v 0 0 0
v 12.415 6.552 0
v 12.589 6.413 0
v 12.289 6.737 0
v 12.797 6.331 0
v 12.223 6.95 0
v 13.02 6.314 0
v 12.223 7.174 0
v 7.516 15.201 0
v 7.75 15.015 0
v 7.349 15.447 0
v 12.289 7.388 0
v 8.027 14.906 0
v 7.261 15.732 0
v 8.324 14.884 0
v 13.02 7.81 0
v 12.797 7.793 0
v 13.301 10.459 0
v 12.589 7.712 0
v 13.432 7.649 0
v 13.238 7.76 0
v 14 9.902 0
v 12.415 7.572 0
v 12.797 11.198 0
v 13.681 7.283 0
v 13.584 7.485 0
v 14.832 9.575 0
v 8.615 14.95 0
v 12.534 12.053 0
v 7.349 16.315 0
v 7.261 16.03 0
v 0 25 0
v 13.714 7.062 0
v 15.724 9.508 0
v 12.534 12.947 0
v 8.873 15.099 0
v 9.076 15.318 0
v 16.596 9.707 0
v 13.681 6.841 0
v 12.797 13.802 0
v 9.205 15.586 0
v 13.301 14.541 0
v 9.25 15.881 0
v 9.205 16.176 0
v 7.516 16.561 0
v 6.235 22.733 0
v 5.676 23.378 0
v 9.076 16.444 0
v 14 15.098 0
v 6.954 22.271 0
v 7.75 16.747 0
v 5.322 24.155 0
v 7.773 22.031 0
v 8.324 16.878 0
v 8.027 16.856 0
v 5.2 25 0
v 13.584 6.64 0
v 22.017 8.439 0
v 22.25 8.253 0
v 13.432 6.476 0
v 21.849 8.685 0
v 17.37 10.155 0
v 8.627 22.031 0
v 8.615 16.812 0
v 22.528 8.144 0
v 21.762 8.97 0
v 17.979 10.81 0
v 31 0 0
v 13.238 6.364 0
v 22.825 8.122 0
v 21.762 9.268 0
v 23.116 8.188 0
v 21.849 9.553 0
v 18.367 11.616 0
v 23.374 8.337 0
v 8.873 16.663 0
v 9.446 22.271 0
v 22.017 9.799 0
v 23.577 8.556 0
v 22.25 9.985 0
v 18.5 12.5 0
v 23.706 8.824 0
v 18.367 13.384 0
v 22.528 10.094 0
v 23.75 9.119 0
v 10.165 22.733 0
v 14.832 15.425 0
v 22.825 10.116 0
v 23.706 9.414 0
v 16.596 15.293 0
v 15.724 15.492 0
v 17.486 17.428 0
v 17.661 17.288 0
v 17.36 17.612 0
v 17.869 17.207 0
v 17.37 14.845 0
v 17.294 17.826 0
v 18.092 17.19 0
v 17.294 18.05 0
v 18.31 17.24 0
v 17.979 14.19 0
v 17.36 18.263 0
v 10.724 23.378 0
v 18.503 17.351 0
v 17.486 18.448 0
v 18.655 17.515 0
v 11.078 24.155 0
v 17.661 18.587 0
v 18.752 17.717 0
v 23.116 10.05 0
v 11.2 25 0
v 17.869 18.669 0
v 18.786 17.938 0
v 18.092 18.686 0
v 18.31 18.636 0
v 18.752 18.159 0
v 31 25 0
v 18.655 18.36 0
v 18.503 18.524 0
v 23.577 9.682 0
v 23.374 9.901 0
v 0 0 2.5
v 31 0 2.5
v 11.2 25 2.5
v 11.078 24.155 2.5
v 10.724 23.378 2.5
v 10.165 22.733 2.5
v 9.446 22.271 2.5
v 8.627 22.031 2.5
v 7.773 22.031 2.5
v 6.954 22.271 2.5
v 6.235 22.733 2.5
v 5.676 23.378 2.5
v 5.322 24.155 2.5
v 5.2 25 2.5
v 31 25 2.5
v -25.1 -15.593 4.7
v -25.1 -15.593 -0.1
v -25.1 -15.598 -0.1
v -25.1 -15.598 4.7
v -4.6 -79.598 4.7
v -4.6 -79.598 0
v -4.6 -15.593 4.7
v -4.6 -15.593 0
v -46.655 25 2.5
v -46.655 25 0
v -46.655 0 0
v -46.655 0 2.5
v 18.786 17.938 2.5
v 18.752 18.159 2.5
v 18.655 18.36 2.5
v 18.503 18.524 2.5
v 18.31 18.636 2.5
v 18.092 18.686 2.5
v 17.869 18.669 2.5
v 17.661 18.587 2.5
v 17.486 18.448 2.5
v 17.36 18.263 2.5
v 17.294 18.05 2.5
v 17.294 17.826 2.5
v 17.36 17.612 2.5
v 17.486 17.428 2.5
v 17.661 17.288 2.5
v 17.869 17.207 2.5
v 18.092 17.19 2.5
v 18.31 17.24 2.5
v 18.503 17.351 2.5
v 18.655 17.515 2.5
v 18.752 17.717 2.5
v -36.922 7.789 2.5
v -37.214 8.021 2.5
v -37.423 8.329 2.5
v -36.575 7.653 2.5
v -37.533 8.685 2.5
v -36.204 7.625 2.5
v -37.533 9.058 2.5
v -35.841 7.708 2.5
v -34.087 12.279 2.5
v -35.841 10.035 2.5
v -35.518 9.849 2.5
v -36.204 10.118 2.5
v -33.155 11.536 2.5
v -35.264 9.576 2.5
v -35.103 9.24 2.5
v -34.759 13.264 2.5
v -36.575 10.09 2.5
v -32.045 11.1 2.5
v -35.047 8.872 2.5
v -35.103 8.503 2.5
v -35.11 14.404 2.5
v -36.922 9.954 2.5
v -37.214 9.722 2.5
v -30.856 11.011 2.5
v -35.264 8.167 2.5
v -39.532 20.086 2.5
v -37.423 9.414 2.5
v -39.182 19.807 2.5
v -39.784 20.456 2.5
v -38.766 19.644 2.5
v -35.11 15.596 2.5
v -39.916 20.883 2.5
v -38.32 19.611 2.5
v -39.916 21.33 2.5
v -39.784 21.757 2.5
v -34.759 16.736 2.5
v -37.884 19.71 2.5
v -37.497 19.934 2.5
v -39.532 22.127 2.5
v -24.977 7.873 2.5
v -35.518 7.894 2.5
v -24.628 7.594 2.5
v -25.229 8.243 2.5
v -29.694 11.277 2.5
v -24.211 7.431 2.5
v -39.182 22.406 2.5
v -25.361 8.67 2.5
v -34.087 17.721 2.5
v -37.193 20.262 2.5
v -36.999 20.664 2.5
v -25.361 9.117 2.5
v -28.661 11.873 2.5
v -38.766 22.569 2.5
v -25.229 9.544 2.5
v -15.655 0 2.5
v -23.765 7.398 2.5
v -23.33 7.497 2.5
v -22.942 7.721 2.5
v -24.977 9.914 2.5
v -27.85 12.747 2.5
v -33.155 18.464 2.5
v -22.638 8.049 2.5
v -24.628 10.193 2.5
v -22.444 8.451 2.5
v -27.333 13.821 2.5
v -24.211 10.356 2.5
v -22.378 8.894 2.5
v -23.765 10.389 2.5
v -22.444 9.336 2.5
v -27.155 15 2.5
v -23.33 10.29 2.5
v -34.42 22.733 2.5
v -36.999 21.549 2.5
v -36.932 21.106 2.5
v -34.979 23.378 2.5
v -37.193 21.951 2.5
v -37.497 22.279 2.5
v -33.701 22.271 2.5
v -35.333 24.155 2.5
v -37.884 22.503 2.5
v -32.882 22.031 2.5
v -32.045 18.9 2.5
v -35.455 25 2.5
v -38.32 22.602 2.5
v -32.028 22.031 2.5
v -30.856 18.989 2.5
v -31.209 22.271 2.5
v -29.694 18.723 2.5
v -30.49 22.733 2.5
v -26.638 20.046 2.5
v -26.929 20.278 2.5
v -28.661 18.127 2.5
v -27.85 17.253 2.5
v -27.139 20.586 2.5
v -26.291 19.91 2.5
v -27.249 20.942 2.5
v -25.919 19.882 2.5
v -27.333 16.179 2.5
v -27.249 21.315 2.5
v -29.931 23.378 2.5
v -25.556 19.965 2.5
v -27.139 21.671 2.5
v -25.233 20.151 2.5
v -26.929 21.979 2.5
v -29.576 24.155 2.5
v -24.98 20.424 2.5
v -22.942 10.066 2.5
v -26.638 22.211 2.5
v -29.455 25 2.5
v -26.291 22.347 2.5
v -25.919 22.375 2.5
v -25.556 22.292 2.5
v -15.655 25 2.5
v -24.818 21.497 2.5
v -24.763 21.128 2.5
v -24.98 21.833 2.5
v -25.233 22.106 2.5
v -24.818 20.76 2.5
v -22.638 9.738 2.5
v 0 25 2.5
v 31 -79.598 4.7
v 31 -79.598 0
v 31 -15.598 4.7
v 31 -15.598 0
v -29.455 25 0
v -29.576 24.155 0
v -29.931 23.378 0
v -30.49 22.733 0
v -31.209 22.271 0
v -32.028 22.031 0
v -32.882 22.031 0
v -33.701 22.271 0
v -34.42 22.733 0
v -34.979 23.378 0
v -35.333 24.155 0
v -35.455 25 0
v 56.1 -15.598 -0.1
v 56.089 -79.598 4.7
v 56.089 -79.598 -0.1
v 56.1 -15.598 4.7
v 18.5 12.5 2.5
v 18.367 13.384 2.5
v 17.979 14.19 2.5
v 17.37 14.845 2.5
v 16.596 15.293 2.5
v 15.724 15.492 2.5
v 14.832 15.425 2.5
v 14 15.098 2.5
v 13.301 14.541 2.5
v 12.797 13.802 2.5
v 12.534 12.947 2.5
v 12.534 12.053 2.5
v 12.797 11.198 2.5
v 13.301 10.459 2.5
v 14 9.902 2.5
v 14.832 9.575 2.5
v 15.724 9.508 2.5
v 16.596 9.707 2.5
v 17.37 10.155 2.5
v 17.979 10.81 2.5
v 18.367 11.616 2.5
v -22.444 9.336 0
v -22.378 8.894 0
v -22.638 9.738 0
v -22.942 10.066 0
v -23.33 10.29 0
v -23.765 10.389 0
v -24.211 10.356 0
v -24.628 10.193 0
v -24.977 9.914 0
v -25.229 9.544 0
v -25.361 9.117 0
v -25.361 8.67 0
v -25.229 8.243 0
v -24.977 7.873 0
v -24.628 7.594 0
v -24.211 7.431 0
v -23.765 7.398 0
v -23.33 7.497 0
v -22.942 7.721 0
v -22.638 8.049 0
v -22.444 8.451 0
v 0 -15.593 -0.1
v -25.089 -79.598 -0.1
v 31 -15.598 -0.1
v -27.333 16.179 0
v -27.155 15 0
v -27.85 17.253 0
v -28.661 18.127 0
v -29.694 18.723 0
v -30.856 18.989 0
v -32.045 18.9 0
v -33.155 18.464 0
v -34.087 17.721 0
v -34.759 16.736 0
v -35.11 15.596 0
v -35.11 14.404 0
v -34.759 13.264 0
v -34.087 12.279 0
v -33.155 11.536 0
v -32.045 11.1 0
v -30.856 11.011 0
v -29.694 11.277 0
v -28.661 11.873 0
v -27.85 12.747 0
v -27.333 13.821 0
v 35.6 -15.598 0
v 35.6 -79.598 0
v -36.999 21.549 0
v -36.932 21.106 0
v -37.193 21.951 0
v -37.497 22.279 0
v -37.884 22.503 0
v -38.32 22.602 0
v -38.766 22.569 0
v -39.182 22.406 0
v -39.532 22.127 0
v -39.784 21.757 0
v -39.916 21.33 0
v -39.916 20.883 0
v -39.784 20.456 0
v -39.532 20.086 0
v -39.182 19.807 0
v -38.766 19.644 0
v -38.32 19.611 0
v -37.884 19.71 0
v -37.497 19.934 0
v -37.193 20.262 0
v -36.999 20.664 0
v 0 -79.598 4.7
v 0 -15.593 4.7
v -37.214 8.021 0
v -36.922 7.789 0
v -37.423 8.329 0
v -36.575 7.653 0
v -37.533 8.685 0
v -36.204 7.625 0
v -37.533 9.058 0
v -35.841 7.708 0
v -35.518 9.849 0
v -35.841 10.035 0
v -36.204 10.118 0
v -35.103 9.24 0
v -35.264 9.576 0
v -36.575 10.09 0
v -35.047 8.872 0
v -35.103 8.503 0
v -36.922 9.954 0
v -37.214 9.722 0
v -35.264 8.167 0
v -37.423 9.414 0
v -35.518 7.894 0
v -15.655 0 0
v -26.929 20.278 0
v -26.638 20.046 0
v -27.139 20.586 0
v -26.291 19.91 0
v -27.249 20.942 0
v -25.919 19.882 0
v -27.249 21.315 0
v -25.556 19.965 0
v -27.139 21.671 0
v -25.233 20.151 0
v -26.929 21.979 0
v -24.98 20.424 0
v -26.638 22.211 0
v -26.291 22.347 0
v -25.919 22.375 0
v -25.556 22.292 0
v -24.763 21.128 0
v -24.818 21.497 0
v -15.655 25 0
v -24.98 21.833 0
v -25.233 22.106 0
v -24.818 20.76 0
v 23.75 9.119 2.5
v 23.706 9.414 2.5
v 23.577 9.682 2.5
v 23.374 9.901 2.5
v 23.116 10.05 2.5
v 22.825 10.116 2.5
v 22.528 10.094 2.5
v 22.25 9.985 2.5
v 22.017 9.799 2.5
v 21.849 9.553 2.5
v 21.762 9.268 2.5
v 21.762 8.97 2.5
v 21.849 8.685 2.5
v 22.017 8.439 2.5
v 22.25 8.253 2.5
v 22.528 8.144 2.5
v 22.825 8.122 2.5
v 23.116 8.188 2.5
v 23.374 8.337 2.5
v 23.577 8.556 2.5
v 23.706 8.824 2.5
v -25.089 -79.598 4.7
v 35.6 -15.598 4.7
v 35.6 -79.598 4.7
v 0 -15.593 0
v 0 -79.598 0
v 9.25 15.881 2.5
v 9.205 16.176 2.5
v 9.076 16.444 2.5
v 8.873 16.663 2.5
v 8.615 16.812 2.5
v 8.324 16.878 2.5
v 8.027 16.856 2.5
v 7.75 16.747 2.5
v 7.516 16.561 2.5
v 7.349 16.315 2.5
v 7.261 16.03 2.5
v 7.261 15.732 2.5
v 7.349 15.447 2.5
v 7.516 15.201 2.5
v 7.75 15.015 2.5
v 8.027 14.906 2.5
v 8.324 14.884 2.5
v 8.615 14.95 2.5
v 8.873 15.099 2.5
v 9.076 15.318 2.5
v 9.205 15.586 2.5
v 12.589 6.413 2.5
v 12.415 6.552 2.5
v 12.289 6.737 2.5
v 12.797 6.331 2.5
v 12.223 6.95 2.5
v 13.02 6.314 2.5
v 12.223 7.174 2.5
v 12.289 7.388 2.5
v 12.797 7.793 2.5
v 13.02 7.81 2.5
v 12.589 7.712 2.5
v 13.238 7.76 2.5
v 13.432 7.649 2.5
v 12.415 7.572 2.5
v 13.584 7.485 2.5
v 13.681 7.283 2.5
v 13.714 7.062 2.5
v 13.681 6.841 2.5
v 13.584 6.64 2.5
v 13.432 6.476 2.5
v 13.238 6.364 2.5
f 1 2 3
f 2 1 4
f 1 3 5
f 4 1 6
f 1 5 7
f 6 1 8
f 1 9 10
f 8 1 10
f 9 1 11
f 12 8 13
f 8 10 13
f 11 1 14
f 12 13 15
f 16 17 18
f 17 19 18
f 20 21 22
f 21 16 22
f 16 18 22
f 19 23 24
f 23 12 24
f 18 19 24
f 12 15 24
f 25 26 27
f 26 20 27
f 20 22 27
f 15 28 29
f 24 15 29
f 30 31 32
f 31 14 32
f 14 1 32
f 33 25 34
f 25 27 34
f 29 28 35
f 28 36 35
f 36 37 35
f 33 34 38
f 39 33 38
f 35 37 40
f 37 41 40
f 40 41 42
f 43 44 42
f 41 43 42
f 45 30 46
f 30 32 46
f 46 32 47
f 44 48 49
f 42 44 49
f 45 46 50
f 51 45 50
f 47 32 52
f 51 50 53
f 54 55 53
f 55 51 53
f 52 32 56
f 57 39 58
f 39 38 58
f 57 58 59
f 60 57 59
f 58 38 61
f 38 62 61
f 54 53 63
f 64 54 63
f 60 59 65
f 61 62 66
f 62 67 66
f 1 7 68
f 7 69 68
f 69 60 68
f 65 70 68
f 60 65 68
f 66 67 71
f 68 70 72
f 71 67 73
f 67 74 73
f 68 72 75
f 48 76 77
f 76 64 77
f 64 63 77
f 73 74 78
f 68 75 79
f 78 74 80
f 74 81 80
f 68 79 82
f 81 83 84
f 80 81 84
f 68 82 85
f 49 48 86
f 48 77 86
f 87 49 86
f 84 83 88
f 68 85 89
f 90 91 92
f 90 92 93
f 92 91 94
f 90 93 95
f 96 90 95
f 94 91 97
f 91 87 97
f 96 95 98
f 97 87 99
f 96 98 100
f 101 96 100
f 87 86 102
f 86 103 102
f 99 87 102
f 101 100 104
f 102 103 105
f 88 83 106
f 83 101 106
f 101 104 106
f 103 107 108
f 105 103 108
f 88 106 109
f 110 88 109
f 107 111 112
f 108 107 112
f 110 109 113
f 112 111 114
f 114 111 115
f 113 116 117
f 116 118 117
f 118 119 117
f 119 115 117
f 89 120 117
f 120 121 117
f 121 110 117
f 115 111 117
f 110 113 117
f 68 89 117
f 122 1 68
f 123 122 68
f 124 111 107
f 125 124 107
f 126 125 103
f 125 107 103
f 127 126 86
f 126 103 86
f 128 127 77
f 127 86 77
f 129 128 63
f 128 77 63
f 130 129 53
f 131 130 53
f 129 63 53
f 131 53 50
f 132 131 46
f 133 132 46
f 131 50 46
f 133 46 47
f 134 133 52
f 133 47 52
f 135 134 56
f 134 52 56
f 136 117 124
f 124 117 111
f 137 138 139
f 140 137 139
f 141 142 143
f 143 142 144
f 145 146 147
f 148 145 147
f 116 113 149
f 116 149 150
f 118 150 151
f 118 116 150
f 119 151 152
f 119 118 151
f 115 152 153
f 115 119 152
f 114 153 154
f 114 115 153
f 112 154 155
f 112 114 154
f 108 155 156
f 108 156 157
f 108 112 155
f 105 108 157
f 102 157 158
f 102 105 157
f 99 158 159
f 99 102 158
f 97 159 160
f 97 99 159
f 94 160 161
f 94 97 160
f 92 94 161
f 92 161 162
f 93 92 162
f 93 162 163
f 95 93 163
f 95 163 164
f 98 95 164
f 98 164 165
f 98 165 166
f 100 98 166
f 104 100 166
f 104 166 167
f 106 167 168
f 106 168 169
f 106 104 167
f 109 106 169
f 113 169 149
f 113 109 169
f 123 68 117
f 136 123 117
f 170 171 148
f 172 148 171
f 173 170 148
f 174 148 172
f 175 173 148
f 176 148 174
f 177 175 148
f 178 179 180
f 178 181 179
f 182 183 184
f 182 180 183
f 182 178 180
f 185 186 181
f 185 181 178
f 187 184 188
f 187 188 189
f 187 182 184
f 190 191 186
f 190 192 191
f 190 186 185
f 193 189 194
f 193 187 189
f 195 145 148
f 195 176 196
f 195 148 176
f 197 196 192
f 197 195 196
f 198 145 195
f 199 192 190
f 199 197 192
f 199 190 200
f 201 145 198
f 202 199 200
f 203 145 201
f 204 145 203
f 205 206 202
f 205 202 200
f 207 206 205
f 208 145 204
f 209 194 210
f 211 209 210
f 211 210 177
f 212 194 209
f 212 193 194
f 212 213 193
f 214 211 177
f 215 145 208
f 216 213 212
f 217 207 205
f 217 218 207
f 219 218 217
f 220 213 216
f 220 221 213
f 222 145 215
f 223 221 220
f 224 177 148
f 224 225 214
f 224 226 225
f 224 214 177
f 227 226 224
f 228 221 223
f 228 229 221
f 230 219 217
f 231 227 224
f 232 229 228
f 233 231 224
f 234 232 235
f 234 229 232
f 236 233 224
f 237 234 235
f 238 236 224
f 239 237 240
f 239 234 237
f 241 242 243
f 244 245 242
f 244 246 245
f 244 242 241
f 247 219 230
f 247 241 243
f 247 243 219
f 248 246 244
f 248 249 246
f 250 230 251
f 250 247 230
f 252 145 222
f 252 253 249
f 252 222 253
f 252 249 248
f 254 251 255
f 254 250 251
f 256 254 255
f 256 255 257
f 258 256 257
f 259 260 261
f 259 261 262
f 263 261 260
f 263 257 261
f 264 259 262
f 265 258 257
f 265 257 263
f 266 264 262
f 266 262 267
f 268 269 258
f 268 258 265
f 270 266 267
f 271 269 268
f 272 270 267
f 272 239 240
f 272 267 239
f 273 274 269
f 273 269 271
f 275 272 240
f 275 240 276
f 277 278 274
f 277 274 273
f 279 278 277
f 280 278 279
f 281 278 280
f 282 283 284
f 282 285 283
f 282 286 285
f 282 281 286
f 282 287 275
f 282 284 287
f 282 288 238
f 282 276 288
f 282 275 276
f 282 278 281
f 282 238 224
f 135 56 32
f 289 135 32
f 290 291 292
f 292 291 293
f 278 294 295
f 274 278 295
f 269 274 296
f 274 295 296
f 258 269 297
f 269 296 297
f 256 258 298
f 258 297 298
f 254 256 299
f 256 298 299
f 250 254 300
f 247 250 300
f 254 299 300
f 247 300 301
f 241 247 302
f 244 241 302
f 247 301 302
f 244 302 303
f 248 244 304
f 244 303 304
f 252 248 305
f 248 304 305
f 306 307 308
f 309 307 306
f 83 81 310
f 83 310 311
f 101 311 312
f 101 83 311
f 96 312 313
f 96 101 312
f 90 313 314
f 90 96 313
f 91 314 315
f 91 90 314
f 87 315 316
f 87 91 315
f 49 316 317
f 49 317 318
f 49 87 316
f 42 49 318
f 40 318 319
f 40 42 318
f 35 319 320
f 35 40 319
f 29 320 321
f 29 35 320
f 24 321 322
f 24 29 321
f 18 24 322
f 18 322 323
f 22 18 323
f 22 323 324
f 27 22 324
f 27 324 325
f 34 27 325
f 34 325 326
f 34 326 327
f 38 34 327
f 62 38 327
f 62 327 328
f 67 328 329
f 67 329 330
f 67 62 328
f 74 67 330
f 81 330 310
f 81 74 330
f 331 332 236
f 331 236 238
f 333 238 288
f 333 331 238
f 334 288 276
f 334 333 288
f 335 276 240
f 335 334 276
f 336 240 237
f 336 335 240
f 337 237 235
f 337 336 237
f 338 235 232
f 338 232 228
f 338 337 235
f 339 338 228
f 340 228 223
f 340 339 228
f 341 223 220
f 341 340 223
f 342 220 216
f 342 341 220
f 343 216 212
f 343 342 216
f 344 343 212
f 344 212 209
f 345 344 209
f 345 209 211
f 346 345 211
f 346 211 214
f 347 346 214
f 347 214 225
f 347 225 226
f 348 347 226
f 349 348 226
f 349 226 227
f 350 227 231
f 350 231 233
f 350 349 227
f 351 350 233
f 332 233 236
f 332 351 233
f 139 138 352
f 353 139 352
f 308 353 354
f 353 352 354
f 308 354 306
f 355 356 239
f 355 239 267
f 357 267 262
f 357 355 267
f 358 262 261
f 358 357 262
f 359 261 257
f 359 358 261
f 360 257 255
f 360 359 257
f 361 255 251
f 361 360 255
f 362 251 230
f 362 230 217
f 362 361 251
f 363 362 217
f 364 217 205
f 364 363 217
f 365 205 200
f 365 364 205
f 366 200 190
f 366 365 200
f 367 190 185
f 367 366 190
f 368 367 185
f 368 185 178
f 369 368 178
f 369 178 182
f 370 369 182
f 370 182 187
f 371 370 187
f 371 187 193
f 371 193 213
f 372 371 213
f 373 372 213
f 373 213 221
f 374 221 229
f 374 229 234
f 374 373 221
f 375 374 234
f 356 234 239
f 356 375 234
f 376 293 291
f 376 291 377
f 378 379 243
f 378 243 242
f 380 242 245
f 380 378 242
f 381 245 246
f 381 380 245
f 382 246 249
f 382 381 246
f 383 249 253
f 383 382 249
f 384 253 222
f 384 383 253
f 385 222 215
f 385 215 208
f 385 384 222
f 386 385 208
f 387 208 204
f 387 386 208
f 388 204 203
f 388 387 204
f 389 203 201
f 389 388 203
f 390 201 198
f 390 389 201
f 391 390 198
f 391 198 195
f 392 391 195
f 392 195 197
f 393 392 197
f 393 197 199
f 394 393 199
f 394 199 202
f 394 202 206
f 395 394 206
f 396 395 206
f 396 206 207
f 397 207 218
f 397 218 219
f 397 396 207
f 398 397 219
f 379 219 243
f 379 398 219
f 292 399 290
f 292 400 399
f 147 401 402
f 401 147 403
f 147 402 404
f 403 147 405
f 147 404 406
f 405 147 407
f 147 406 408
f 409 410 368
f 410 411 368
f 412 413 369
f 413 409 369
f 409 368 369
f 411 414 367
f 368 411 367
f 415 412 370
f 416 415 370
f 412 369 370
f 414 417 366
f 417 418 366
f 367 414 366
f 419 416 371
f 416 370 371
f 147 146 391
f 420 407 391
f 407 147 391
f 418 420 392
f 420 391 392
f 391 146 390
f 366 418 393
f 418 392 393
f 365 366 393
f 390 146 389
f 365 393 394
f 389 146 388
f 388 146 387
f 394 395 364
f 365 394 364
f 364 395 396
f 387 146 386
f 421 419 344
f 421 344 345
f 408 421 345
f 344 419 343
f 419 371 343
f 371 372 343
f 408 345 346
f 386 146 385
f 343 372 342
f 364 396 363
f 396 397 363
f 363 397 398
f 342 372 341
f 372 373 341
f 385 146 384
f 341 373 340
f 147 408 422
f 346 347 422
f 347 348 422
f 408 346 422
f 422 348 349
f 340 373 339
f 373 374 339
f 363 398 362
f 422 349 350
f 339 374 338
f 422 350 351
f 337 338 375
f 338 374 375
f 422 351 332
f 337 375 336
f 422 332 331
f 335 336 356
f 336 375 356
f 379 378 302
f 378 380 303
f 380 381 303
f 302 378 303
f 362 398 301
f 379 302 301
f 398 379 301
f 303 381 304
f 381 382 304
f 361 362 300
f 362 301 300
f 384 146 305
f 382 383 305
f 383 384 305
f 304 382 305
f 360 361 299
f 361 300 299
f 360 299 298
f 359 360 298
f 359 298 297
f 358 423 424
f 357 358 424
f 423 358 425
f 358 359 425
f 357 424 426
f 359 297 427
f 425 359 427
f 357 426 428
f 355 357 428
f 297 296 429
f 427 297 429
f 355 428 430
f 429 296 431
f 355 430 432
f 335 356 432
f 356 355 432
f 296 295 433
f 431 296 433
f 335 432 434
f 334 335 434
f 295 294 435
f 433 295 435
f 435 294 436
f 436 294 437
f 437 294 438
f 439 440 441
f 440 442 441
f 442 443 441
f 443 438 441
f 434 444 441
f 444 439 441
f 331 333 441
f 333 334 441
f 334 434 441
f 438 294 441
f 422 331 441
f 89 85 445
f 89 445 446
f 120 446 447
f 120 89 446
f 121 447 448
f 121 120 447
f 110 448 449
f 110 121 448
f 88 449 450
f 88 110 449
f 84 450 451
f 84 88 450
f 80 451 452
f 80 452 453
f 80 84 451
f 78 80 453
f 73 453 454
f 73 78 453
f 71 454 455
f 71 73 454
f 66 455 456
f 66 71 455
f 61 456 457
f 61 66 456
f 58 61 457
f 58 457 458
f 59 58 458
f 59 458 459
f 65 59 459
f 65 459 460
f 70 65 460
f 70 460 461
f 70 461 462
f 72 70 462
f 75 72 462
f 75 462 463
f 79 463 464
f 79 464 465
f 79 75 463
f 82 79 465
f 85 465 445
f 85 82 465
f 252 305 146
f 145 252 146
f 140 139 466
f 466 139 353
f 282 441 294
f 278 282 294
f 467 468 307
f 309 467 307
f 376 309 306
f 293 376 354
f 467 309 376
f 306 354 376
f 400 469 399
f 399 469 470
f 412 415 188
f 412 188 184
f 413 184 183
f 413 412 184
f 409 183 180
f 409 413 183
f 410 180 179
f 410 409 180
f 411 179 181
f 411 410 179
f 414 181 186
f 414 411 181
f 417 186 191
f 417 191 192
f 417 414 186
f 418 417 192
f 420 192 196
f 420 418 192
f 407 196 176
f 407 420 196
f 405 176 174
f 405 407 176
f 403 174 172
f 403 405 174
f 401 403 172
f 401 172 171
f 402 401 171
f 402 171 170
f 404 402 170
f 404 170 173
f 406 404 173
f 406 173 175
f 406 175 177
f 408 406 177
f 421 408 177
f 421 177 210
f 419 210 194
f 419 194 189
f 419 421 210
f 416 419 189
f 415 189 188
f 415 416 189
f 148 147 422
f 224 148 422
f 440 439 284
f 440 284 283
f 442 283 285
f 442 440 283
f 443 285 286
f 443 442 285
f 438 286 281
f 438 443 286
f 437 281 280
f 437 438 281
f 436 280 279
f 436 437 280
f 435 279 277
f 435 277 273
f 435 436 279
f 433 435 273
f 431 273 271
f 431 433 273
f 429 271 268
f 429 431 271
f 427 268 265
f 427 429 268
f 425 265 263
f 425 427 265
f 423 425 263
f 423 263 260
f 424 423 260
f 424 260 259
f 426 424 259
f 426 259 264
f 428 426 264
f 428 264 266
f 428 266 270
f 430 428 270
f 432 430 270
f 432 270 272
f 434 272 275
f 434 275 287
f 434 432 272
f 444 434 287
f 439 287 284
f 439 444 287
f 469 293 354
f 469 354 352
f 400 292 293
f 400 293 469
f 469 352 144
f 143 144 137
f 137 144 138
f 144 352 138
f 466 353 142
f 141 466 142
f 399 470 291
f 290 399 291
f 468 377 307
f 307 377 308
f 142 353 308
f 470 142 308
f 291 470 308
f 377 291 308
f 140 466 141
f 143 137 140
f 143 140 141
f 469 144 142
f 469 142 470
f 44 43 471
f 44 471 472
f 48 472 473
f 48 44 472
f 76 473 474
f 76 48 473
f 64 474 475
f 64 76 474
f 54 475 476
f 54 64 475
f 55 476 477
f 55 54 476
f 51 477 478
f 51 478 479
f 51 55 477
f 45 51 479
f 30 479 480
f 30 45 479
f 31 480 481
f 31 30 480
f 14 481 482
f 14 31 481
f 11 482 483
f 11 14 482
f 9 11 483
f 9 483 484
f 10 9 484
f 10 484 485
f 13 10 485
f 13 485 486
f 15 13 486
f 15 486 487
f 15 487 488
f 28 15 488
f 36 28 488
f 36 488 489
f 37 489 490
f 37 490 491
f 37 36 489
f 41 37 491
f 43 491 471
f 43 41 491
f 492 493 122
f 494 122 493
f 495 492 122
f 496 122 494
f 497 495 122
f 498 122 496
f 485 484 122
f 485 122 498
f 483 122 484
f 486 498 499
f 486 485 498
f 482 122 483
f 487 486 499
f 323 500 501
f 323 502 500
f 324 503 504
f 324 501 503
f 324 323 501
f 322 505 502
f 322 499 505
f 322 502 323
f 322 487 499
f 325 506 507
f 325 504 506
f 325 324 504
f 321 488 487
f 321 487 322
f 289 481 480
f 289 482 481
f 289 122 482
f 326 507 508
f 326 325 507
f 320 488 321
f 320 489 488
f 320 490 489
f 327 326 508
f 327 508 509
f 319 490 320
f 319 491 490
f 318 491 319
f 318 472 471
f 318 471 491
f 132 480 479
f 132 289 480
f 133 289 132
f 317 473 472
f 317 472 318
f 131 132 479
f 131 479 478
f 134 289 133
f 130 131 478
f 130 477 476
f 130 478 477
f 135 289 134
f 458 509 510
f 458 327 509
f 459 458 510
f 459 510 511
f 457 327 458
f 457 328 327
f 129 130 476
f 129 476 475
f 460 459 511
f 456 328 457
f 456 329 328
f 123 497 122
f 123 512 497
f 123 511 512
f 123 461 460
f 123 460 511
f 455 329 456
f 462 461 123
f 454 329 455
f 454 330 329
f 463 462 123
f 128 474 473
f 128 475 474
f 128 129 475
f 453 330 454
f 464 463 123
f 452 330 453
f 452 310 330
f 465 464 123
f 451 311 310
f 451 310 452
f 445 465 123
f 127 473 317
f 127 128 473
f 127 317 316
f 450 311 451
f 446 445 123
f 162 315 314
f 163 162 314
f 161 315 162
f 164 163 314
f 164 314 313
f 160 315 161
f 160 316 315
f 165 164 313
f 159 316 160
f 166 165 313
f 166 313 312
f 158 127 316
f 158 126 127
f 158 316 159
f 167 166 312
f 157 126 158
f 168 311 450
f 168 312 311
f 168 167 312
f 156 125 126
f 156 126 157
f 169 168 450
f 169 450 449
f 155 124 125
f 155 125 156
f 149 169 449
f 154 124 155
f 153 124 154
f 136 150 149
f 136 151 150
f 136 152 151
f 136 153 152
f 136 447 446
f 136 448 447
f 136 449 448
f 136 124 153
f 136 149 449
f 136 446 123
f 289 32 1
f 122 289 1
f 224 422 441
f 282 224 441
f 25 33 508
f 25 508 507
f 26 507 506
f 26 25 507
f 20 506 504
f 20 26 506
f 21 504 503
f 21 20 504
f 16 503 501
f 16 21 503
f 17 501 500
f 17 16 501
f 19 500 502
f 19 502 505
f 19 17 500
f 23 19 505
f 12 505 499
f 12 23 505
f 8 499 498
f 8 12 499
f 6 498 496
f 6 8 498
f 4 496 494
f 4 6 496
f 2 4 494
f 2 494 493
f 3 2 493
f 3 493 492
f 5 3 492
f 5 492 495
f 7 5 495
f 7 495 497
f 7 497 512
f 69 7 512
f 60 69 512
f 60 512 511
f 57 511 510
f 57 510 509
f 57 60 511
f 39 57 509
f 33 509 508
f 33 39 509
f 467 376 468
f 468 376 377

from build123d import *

# Parameters (mm, degrees)
F1_R     = 0.75
F1_R_2   = 1
F1_R_3   = 3
F4_DEPTH = 2.5
F2_R     = 1.25
F2_R_2   = 1.5
F2_R_3   = 4
F3_W     = 4.6
F3_H     = 64
F5_DEPTH = 0.1
F6_DEPTH = 4.7


# Not quite as in the source:
# - ends of sketch curves that miss each other by under 0.0002 mm in the source are joined


with BuildPart() as f4:
    # F1 (on Top) → F4 (new body)
    with BuildSketch(Plane.XY):
        with BuildLine():
            Line((0, 25), (0, 0))
            Line((0, 0), (31, 0))
            Line((31, 0), (31, 25))
            Line((31, 25), (26.3, 25))
            Line((26.3, 25), (11.2, 25))
            ThreePointArc((11.2, 25), (8.2, 22), (5.2, 25))
            Line((5.2, 25), (0, 25))
        make_face()
        with Locations((12.9642904296, 7.0621532778)):
            Circle(F1_R, mode=Mode.SUBTRACT)
        with Locations((22.7504622963, 9.1190539061)):
            Circle(F1_R_2, mode=Mode.SUBTRACT)
        with Locations((8.2495377037, 15.8809460939)):
            Circle(F1_R_2, mode=Mode.SUBTRACT)
        with Locations((15.5, 12.5)):
            Circle(F1_R_3, mode=Mode.SUBTRACT)
        with Locations((18.0357095704, 17.9378467222)):
            Circle(F1_R, mode=Mode.SUBTRACT)
    extrude(amount=F4_DEPTH)


with BuildPart() as f4b:
    # F2 (on Top) → F4, piece 2 (new body)
    with BuildSketch(Plane.XY):
        with BuildLine():
            Line((-46.6549531966, 25), (-46.6549531966, 0))
            Line((-46.6549531966, 0), (-15.6549531966, 0))
            Line((-15.6549531966, 0), (-15.6549531966, 25))
            Line((-15.6549531966, 25), (-20.3549531966, 25))
            Line((-20.3549531966, 25), (-29.4549531966, 25))
            ThreePointArc((-29.4549531966, 25), (-32.4549531966, 22), (-35.4549531966, 25))
            Line((-35.4549531966, 25), (-46.6549531966, 25))
        make_face()
        with Locations((-36.2972540741, 8.871644455)):
            Circle(F2_R, mode=Mode.SUBTRACT)
        with Locations((-23.877530987, 8.893517708)):
            Circle(F2_R_2, mode=Mode.SUBTRACT)
        with Locations((-38.4323754063, 21.106482292)):
            Circle(F2_R_2, mode=Mode.SUBTRACT)
        with Locations((-31.1549531966, 15)):
            Circle(F2_R_3, mode=Mode.SUBTRACT)
        with Locations((-26.0126523192, 21.128355545)):
            Circle(F2_R, mode=Mode.SUBTRACT)
    extrude(amount=F4_DEPTH)


with BuildPart() as f5:
    # F3 (on Top) → F5 (new body)
    with BuildSketch(Plane.XY):
        Polygon((-25.0888298927, -79.5980651379), (-4.6, -79.5980651379), (-4.6, -15.5980651379), (-4.6, -15.5926546171), (-25.1, -15.5926546171), (-25.1, -15.5980651379), align=None)
        Polygon((-4.6, -79.5980651379), (0, -79.5980651379), (0, -15.5980651379), (0, -15.5926546171), (-4.6, -15.5926546171), (-4.6, -15.5980651379), align=None)
        Polygon((0, -15.5980651379), (0, -79.5980651379), (31, -79.5980651379), (31, -15.5980651379), (0, -15.5926546171), align=None)
        with Locations((33.3, -47.5980651379)):
            Rectangle(F3_W, F3_H)
        Polygon((35.6, -15.5980651379), (35.6, -79.5980651379), (56.0888298927, -79.5980651379), (56.1, -15.5980651379), align=None)
    extrude(amount=-F5_DEPTH)

    # F3 (on Top) → F6 (join)
    with BuildSketch(Plane.XY):
        Polygon((-25.0888298927, -79.5980651379), (-4.6, -79.5980651379), (-4.6, -15.5980651379), (-4.6, -15.5926546171), (-25.1, -15.5926546171), (-25.1, -15.5980651379), align=None)
        Polygon((0, -15.5980651379), (0, -79.5980651379), (31, -79.5980651379), (31, -15.5980651379), (0, -15.5926546171), align=None)
        Polygon((35.6, -15.5980651379), (35.6, -79.5980651379), (56.0888298927, -79.5980651379), (56.1, -15.5980651379), align=None)
    extrude(amount=F6_DEPTH)


solid = Compound([f4.part, f4b.part, f5.part])
